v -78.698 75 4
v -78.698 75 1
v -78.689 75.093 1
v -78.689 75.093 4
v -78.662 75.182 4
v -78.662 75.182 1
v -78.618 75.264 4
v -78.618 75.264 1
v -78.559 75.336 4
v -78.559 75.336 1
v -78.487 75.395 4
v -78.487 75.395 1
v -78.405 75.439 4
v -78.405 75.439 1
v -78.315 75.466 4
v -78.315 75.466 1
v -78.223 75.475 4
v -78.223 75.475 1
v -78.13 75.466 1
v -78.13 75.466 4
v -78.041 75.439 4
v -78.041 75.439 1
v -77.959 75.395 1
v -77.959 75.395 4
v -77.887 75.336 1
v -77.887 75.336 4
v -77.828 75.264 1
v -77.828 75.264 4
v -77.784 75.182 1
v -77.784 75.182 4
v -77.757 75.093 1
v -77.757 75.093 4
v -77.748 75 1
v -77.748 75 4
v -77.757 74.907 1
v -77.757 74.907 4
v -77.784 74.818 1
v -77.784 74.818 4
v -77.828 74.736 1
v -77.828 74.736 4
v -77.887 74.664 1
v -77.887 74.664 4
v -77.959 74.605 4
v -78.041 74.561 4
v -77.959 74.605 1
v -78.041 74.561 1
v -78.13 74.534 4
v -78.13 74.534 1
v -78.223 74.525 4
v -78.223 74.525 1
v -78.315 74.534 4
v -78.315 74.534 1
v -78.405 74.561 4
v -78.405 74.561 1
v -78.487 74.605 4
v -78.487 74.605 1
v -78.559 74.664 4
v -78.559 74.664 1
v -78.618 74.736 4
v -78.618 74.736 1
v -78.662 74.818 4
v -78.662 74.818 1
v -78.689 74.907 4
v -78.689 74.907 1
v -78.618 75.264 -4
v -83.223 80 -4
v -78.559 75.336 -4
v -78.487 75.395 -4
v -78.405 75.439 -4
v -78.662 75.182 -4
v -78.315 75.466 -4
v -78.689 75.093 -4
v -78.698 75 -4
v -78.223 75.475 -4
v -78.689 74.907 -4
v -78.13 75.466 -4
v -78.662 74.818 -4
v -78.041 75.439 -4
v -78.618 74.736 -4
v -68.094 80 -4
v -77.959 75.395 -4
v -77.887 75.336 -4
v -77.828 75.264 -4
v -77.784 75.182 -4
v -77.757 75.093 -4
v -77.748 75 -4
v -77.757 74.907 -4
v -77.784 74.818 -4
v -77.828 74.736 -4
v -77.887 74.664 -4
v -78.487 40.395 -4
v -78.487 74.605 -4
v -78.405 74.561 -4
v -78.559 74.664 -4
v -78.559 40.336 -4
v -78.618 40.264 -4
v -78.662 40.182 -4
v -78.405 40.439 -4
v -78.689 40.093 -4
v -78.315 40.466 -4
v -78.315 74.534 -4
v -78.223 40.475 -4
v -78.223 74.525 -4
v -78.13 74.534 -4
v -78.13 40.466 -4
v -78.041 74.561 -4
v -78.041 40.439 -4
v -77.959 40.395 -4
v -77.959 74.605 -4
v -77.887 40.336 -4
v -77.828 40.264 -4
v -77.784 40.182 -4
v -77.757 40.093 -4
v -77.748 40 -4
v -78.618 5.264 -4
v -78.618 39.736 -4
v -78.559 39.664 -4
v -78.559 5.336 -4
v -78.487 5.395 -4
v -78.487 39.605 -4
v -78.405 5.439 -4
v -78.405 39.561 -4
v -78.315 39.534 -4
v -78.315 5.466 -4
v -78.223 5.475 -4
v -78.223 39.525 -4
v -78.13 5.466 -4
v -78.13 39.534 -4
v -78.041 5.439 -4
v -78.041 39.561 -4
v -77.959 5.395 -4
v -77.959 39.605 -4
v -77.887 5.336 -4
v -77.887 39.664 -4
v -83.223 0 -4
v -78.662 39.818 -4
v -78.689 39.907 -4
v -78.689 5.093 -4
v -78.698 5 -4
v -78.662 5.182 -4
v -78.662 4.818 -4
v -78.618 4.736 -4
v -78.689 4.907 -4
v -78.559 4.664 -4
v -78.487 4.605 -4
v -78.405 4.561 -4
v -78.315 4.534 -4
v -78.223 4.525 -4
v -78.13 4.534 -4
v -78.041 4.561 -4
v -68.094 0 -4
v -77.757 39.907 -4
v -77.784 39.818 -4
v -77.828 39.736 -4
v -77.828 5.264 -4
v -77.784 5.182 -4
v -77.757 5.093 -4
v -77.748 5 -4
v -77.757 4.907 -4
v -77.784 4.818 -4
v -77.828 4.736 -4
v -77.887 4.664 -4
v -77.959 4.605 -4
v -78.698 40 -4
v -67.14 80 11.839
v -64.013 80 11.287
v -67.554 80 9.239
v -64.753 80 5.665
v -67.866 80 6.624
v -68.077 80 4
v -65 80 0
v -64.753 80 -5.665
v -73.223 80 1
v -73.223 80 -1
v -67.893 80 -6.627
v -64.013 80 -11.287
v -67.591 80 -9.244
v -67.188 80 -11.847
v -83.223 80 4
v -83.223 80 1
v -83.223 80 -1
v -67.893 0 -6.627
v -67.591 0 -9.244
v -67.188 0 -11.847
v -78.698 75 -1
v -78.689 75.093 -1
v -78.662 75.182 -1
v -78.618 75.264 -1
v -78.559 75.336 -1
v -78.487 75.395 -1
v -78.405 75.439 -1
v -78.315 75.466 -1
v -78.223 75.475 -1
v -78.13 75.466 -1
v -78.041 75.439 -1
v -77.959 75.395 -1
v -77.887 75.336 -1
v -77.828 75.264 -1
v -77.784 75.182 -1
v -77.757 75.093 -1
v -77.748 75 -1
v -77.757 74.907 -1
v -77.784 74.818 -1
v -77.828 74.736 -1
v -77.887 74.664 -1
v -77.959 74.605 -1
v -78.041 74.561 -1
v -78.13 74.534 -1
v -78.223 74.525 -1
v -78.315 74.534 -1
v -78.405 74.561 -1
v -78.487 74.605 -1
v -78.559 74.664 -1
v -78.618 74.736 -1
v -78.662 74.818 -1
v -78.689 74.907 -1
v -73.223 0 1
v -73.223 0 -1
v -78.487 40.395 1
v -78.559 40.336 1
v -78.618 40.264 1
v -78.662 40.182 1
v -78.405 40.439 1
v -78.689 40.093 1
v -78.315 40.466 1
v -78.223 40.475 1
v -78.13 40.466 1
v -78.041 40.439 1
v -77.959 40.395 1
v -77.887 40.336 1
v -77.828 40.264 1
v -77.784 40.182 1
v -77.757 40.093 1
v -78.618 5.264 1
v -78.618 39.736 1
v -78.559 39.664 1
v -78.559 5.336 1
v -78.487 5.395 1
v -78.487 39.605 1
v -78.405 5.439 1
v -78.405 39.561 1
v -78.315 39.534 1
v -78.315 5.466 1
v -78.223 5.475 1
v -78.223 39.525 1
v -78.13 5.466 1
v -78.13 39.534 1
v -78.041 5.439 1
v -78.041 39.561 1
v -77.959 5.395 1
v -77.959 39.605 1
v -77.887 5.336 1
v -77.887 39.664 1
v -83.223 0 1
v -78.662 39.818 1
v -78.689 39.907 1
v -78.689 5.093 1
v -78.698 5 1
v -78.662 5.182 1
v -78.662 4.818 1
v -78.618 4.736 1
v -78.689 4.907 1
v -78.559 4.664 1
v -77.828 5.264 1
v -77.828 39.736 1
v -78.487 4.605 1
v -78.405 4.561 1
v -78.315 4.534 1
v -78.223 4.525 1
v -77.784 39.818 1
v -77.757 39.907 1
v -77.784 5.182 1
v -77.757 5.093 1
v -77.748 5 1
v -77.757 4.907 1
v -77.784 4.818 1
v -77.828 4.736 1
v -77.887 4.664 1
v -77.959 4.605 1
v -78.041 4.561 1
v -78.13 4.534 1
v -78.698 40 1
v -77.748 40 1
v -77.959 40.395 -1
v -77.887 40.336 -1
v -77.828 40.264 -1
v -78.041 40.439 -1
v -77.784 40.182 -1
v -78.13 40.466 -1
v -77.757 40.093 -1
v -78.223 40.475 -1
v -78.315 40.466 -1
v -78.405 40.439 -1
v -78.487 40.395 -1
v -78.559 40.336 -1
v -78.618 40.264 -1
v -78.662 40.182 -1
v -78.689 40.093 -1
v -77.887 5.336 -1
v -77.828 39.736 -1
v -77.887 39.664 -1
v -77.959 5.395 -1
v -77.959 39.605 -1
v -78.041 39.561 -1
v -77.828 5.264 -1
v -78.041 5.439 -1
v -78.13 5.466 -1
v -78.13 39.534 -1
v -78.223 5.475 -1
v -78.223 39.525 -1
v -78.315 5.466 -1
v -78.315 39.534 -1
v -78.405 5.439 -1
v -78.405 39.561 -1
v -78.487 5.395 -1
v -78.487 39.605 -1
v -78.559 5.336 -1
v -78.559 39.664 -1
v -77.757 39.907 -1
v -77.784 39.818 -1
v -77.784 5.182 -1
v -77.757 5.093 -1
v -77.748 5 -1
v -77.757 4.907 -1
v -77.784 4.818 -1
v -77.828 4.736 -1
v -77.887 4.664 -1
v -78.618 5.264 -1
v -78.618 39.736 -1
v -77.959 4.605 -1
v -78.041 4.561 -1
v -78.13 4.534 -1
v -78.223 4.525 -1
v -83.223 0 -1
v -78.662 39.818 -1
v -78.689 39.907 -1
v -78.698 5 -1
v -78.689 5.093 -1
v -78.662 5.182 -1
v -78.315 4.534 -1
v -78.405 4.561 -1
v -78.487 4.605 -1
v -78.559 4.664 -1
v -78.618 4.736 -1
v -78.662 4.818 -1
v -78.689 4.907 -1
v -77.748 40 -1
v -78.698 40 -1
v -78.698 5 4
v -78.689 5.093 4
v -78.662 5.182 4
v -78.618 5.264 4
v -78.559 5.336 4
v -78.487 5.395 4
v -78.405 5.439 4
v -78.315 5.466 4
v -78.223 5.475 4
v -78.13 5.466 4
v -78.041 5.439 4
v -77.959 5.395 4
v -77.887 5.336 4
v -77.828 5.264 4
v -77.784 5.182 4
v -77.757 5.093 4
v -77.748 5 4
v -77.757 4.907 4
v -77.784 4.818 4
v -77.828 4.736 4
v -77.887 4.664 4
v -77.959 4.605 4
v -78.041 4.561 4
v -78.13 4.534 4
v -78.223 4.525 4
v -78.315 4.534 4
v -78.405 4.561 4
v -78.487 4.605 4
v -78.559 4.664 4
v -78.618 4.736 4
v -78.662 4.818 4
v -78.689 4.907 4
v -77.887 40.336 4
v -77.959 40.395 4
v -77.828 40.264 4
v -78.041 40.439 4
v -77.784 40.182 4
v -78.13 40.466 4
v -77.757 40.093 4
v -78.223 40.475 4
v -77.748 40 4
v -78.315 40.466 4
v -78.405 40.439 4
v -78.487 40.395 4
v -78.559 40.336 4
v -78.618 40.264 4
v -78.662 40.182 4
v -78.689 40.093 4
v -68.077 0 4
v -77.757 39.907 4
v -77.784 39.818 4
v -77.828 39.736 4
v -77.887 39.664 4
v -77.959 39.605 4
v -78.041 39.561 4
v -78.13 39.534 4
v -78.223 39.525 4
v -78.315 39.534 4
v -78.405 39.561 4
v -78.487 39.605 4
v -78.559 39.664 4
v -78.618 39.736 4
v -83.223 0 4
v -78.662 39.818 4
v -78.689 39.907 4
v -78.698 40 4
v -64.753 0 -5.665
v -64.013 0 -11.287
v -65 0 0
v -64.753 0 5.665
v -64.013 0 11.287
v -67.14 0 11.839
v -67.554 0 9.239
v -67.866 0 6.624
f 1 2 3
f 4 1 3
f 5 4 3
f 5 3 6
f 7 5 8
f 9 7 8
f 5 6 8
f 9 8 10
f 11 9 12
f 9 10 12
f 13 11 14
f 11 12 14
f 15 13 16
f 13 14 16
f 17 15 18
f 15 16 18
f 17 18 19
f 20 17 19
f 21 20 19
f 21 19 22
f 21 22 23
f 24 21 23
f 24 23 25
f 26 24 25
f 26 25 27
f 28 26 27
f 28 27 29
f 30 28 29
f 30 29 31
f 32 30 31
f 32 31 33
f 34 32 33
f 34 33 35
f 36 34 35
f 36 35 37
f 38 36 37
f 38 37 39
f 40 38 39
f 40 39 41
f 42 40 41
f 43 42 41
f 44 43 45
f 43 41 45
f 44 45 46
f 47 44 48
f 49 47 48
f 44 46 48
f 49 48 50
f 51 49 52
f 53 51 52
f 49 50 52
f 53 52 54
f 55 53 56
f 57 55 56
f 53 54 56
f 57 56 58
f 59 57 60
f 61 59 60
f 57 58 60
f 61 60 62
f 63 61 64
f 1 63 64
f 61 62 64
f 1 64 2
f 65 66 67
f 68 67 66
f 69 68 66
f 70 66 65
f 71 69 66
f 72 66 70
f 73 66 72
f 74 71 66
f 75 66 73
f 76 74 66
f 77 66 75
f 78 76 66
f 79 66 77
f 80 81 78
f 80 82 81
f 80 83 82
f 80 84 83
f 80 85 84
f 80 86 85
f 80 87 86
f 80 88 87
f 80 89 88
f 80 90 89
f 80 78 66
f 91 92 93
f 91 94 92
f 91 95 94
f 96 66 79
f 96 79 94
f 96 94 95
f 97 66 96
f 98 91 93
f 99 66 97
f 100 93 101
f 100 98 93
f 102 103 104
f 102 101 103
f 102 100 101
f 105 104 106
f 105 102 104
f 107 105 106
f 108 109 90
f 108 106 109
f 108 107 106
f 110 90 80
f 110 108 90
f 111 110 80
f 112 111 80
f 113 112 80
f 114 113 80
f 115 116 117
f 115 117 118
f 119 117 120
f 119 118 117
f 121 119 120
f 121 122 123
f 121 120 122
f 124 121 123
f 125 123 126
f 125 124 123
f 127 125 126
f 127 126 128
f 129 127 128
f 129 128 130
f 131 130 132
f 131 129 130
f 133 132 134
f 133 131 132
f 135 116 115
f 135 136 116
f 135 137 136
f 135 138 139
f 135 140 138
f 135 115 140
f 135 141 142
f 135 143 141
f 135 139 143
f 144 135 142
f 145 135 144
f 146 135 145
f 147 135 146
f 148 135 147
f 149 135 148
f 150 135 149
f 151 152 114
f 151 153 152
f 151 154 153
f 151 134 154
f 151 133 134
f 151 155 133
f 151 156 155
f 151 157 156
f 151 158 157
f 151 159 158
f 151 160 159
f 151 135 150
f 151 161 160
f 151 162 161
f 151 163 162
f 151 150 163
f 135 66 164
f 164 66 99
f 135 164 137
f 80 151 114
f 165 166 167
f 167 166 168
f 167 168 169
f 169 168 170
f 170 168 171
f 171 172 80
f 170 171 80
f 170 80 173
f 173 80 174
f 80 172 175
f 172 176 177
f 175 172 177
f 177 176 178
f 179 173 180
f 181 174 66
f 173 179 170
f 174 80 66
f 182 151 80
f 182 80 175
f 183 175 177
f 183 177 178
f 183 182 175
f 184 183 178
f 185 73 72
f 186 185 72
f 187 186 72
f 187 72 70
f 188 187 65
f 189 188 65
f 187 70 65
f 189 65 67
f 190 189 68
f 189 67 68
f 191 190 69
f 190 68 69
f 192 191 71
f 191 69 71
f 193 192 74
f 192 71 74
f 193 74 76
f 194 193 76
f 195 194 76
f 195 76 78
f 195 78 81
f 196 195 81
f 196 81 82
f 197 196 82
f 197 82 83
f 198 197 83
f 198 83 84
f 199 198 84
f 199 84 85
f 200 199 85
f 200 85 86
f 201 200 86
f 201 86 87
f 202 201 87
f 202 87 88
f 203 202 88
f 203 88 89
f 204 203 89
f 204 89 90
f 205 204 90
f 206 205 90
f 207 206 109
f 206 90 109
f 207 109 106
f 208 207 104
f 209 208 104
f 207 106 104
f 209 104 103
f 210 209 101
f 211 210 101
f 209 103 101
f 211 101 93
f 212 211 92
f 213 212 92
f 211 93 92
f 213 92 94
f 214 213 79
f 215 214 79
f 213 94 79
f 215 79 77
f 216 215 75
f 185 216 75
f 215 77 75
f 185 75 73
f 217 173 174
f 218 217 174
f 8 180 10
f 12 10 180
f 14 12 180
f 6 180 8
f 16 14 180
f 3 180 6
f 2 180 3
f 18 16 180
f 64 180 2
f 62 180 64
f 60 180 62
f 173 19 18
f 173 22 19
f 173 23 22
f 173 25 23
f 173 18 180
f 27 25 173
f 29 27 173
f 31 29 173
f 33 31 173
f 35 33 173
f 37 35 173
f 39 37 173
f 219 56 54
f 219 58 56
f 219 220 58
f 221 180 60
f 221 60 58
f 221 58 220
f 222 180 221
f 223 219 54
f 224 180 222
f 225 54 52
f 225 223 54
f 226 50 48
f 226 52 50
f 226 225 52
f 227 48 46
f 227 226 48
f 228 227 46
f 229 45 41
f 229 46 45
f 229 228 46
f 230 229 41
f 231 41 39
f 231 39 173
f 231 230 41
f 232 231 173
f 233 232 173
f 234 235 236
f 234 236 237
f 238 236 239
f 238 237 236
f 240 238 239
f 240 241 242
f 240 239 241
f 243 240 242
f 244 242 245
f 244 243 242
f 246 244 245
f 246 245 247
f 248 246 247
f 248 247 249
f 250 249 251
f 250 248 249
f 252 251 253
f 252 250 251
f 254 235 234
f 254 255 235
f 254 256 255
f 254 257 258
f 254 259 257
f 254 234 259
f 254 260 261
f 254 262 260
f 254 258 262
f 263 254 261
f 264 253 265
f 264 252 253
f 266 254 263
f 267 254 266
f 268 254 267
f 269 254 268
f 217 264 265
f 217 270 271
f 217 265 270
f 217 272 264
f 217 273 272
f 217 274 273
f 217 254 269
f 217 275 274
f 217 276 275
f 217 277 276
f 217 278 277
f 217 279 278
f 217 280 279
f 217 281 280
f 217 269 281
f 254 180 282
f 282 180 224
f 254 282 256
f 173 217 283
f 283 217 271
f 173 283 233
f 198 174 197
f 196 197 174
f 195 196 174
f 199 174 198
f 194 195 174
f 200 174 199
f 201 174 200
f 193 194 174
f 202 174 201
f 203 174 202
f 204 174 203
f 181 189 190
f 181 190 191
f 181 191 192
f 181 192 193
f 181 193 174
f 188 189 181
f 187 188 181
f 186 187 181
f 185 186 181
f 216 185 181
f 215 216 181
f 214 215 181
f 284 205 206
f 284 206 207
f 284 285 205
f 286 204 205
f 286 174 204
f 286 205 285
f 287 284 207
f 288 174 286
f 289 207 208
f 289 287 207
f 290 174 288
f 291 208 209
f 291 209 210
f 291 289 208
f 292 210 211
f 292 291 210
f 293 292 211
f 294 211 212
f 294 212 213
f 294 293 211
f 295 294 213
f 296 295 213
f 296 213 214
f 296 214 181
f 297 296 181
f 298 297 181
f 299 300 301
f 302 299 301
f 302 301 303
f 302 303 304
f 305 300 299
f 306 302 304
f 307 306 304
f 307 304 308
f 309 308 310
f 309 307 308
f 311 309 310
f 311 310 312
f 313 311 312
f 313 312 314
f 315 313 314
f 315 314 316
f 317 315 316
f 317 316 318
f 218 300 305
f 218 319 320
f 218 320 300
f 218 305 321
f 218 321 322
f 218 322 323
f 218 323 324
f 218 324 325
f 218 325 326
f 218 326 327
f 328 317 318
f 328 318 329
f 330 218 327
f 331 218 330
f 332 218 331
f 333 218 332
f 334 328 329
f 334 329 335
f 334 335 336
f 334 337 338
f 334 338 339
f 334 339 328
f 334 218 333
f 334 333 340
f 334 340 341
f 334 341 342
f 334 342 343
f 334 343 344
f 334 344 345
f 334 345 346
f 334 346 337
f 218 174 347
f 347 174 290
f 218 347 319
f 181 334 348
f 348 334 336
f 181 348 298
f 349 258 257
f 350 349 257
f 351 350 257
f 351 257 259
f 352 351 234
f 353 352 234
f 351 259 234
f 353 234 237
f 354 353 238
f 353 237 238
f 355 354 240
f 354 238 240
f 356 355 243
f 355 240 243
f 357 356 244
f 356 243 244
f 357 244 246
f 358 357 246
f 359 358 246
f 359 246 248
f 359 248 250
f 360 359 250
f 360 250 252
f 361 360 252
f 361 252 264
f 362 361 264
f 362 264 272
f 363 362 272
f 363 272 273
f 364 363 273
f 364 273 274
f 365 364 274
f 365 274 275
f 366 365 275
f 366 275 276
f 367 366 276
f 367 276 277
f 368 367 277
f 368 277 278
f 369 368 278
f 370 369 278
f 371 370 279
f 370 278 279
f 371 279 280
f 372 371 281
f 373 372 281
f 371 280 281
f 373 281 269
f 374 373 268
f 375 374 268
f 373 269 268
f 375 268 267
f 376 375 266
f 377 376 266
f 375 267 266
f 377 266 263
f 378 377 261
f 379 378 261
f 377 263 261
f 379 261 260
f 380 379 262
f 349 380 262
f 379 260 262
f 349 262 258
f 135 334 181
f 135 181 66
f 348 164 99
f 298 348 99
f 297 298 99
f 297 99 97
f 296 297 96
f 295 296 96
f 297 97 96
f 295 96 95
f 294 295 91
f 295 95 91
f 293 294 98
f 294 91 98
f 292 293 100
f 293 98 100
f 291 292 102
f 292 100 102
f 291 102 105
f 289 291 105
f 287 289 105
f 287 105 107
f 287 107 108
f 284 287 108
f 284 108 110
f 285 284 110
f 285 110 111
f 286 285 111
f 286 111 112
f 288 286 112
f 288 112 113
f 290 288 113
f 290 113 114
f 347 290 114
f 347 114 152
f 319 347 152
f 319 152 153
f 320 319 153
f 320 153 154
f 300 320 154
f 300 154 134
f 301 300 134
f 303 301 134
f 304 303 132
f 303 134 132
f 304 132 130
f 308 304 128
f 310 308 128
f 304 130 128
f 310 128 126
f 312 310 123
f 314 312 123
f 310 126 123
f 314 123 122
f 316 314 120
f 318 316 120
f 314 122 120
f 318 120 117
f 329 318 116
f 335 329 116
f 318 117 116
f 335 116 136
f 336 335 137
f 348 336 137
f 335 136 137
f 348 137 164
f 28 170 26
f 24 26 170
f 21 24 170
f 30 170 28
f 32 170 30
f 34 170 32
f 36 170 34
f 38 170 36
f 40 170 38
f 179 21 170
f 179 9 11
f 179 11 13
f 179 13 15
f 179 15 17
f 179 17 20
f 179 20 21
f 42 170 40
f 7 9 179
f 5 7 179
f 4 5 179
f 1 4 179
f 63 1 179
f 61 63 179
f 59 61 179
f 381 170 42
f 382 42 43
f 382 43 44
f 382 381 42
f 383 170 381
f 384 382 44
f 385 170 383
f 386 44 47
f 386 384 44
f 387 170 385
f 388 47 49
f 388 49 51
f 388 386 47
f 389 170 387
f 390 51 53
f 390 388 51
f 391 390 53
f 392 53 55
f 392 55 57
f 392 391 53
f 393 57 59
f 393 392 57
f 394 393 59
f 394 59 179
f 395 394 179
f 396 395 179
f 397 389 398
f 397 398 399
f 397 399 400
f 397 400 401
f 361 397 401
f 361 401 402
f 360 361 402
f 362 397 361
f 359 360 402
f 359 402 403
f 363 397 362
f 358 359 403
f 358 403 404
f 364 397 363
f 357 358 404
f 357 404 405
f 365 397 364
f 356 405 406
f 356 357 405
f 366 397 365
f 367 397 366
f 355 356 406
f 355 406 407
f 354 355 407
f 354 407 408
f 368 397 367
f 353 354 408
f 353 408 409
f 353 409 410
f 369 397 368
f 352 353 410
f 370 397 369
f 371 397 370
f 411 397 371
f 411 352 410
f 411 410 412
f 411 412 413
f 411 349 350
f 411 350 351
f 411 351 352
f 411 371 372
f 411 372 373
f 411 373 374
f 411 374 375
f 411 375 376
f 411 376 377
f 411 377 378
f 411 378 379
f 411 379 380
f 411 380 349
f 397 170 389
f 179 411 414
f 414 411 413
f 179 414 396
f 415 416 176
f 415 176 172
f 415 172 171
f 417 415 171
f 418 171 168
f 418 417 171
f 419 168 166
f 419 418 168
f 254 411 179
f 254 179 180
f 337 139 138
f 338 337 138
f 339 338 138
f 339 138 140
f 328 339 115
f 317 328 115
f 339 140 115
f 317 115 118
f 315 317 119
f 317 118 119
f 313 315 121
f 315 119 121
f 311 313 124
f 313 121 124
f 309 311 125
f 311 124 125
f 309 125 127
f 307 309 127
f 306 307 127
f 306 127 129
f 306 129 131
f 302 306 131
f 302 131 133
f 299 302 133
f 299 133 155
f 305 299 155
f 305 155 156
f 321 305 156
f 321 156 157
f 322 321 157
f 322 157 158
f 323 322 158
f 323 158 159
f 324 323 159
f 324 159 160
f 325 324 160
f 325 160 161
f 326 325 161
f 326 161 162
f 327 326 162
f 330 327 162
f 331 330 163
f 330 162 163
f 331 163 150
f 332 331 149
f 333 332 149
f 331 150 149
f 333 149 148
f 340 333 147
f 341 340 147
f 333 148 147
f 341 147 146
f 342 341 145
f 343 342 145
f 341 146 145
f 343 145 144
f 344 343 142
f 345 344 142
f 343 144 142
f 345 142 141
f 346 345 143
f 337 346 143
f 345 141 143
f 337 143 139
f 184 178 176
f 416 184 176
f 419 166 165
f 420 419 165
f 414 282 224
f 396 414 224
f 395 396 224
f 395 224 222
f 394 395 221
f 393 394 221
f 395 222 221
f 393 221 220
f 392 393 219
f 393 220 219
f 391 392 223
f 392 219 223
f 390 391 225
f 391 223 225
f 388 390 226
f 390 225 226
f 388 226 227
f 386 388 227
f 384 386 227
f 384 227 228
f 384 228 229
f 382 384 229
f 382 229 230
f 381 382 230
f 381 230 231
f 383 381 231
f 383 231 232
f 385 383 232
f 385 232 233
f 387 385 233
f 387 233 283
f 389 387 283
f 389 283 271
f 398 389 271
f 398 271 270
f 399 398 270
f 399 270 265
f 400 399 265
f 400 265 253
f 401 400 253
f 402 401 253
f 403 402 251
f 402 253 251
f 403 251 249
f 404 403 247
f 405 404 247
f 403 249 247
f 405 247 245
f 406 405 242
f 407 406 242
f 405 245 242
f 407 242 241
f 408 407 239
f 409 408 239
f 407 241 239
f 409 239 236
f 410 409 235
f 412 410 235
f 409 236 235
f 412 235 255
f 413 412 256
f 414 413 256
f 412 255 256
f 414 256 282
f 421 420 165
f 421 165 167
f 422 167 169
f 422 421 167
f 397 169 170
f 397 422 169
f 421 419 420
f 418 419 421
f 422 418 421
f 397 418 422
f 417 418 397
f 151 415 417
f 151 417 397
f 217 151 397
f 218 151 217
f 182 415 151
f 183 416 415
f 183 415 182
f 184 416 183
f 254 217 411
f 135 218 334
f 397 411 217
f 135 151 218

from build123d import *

# Parameters (mm, degrees)
BOSS_EXTRUDE1_DEPTH      = 80
M1_2X0_25_TAPPED_HOLE2_D = 0.95


with BuildPart() as part:
    # Sketch1 → Boss-Extrude1 (new body)
    with BuildSketch(Plane(origin=(0, 0, 0), x_dir=(1, 0, 0), z_dir=(0, 1, 0))):
        with BuildLine():
            Line((-64.012503946, -11.287131548), (-67.140480461, -11.838678203))
            ThreePointArc((-67.140480461, -11.838678203), (-67.722822081, -7.932947987), (-68.07746332, -4))
            Line((-68.07746332, -4), (-68.222773013, -4))
            Line((-68.222773013, -4), (-83.222773013, -4))
            Line((-83.222773013, -4), (-83.222773013, -1))
            Line((-83.222773013, -1), (-73.222773013, -1))
            Line((-73.222773013, -1), (-73.222773013, 1))
            Line((-73.222773013, 1), (-83.222773013, 1))
            Line((-83.222773013, 1), (-83.222773013, 4))
            Line((-83.222773013, 4), (-68.222773013, 4))
            Line((-68.222773013, 4), (-68.093710355, 4))
            ThreePointArc((-68.093710355, 4), (-67.754779073, 7.936674143), (-67.187770434, 11.847016701))
            Line((-67.187770434, 11.847016701), (-64.012503946, 11.287131548))
            ThreePointArc((-64.012503946, 11.287131548), (-65, 0), (-64.012503946, -11.287131548))
        make_face()
    extrude(amount=BOSS_EXTRUDE1_DEPTH)

    # M1.2x0.25 Tapped Hole2 (through all)
    with Locations(Plane.XY.offset(4)):
        with Locations((-78.222773013, 75), (-78.222773013, 40), (-78.222773013, 5)):
            Hole(M1_2X0_25_TAPPED_HOLE2_D / 2)


solid = part.part
